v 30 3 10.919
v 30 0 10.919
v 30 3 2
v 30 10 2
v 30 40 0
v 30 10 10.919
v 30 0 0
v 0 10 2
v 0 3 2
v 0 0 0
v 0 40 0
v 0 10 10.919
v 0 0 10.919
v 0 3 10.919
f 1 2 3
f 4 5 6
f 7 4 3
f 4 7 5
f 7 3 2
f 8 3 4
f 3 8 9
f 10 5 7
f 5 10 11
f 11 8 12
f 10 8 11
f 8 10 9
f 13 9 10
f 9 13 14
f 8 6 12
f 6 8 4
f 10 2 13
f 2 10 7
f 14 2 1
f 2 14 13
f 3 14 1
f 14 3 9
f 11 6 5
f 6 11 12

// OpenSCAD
angle = 20;

width = 30;
length = 20*1.5;

height = tan(angle) * length;
union(){
    cube([width,10,2]);
    cube([width,3,height]);
    translate([0,10,0]) hull(){
        cube([width,0.0001,height]);
        translate([0,length,0]) cube([width,0.0001,0.0001]);
    }
}
